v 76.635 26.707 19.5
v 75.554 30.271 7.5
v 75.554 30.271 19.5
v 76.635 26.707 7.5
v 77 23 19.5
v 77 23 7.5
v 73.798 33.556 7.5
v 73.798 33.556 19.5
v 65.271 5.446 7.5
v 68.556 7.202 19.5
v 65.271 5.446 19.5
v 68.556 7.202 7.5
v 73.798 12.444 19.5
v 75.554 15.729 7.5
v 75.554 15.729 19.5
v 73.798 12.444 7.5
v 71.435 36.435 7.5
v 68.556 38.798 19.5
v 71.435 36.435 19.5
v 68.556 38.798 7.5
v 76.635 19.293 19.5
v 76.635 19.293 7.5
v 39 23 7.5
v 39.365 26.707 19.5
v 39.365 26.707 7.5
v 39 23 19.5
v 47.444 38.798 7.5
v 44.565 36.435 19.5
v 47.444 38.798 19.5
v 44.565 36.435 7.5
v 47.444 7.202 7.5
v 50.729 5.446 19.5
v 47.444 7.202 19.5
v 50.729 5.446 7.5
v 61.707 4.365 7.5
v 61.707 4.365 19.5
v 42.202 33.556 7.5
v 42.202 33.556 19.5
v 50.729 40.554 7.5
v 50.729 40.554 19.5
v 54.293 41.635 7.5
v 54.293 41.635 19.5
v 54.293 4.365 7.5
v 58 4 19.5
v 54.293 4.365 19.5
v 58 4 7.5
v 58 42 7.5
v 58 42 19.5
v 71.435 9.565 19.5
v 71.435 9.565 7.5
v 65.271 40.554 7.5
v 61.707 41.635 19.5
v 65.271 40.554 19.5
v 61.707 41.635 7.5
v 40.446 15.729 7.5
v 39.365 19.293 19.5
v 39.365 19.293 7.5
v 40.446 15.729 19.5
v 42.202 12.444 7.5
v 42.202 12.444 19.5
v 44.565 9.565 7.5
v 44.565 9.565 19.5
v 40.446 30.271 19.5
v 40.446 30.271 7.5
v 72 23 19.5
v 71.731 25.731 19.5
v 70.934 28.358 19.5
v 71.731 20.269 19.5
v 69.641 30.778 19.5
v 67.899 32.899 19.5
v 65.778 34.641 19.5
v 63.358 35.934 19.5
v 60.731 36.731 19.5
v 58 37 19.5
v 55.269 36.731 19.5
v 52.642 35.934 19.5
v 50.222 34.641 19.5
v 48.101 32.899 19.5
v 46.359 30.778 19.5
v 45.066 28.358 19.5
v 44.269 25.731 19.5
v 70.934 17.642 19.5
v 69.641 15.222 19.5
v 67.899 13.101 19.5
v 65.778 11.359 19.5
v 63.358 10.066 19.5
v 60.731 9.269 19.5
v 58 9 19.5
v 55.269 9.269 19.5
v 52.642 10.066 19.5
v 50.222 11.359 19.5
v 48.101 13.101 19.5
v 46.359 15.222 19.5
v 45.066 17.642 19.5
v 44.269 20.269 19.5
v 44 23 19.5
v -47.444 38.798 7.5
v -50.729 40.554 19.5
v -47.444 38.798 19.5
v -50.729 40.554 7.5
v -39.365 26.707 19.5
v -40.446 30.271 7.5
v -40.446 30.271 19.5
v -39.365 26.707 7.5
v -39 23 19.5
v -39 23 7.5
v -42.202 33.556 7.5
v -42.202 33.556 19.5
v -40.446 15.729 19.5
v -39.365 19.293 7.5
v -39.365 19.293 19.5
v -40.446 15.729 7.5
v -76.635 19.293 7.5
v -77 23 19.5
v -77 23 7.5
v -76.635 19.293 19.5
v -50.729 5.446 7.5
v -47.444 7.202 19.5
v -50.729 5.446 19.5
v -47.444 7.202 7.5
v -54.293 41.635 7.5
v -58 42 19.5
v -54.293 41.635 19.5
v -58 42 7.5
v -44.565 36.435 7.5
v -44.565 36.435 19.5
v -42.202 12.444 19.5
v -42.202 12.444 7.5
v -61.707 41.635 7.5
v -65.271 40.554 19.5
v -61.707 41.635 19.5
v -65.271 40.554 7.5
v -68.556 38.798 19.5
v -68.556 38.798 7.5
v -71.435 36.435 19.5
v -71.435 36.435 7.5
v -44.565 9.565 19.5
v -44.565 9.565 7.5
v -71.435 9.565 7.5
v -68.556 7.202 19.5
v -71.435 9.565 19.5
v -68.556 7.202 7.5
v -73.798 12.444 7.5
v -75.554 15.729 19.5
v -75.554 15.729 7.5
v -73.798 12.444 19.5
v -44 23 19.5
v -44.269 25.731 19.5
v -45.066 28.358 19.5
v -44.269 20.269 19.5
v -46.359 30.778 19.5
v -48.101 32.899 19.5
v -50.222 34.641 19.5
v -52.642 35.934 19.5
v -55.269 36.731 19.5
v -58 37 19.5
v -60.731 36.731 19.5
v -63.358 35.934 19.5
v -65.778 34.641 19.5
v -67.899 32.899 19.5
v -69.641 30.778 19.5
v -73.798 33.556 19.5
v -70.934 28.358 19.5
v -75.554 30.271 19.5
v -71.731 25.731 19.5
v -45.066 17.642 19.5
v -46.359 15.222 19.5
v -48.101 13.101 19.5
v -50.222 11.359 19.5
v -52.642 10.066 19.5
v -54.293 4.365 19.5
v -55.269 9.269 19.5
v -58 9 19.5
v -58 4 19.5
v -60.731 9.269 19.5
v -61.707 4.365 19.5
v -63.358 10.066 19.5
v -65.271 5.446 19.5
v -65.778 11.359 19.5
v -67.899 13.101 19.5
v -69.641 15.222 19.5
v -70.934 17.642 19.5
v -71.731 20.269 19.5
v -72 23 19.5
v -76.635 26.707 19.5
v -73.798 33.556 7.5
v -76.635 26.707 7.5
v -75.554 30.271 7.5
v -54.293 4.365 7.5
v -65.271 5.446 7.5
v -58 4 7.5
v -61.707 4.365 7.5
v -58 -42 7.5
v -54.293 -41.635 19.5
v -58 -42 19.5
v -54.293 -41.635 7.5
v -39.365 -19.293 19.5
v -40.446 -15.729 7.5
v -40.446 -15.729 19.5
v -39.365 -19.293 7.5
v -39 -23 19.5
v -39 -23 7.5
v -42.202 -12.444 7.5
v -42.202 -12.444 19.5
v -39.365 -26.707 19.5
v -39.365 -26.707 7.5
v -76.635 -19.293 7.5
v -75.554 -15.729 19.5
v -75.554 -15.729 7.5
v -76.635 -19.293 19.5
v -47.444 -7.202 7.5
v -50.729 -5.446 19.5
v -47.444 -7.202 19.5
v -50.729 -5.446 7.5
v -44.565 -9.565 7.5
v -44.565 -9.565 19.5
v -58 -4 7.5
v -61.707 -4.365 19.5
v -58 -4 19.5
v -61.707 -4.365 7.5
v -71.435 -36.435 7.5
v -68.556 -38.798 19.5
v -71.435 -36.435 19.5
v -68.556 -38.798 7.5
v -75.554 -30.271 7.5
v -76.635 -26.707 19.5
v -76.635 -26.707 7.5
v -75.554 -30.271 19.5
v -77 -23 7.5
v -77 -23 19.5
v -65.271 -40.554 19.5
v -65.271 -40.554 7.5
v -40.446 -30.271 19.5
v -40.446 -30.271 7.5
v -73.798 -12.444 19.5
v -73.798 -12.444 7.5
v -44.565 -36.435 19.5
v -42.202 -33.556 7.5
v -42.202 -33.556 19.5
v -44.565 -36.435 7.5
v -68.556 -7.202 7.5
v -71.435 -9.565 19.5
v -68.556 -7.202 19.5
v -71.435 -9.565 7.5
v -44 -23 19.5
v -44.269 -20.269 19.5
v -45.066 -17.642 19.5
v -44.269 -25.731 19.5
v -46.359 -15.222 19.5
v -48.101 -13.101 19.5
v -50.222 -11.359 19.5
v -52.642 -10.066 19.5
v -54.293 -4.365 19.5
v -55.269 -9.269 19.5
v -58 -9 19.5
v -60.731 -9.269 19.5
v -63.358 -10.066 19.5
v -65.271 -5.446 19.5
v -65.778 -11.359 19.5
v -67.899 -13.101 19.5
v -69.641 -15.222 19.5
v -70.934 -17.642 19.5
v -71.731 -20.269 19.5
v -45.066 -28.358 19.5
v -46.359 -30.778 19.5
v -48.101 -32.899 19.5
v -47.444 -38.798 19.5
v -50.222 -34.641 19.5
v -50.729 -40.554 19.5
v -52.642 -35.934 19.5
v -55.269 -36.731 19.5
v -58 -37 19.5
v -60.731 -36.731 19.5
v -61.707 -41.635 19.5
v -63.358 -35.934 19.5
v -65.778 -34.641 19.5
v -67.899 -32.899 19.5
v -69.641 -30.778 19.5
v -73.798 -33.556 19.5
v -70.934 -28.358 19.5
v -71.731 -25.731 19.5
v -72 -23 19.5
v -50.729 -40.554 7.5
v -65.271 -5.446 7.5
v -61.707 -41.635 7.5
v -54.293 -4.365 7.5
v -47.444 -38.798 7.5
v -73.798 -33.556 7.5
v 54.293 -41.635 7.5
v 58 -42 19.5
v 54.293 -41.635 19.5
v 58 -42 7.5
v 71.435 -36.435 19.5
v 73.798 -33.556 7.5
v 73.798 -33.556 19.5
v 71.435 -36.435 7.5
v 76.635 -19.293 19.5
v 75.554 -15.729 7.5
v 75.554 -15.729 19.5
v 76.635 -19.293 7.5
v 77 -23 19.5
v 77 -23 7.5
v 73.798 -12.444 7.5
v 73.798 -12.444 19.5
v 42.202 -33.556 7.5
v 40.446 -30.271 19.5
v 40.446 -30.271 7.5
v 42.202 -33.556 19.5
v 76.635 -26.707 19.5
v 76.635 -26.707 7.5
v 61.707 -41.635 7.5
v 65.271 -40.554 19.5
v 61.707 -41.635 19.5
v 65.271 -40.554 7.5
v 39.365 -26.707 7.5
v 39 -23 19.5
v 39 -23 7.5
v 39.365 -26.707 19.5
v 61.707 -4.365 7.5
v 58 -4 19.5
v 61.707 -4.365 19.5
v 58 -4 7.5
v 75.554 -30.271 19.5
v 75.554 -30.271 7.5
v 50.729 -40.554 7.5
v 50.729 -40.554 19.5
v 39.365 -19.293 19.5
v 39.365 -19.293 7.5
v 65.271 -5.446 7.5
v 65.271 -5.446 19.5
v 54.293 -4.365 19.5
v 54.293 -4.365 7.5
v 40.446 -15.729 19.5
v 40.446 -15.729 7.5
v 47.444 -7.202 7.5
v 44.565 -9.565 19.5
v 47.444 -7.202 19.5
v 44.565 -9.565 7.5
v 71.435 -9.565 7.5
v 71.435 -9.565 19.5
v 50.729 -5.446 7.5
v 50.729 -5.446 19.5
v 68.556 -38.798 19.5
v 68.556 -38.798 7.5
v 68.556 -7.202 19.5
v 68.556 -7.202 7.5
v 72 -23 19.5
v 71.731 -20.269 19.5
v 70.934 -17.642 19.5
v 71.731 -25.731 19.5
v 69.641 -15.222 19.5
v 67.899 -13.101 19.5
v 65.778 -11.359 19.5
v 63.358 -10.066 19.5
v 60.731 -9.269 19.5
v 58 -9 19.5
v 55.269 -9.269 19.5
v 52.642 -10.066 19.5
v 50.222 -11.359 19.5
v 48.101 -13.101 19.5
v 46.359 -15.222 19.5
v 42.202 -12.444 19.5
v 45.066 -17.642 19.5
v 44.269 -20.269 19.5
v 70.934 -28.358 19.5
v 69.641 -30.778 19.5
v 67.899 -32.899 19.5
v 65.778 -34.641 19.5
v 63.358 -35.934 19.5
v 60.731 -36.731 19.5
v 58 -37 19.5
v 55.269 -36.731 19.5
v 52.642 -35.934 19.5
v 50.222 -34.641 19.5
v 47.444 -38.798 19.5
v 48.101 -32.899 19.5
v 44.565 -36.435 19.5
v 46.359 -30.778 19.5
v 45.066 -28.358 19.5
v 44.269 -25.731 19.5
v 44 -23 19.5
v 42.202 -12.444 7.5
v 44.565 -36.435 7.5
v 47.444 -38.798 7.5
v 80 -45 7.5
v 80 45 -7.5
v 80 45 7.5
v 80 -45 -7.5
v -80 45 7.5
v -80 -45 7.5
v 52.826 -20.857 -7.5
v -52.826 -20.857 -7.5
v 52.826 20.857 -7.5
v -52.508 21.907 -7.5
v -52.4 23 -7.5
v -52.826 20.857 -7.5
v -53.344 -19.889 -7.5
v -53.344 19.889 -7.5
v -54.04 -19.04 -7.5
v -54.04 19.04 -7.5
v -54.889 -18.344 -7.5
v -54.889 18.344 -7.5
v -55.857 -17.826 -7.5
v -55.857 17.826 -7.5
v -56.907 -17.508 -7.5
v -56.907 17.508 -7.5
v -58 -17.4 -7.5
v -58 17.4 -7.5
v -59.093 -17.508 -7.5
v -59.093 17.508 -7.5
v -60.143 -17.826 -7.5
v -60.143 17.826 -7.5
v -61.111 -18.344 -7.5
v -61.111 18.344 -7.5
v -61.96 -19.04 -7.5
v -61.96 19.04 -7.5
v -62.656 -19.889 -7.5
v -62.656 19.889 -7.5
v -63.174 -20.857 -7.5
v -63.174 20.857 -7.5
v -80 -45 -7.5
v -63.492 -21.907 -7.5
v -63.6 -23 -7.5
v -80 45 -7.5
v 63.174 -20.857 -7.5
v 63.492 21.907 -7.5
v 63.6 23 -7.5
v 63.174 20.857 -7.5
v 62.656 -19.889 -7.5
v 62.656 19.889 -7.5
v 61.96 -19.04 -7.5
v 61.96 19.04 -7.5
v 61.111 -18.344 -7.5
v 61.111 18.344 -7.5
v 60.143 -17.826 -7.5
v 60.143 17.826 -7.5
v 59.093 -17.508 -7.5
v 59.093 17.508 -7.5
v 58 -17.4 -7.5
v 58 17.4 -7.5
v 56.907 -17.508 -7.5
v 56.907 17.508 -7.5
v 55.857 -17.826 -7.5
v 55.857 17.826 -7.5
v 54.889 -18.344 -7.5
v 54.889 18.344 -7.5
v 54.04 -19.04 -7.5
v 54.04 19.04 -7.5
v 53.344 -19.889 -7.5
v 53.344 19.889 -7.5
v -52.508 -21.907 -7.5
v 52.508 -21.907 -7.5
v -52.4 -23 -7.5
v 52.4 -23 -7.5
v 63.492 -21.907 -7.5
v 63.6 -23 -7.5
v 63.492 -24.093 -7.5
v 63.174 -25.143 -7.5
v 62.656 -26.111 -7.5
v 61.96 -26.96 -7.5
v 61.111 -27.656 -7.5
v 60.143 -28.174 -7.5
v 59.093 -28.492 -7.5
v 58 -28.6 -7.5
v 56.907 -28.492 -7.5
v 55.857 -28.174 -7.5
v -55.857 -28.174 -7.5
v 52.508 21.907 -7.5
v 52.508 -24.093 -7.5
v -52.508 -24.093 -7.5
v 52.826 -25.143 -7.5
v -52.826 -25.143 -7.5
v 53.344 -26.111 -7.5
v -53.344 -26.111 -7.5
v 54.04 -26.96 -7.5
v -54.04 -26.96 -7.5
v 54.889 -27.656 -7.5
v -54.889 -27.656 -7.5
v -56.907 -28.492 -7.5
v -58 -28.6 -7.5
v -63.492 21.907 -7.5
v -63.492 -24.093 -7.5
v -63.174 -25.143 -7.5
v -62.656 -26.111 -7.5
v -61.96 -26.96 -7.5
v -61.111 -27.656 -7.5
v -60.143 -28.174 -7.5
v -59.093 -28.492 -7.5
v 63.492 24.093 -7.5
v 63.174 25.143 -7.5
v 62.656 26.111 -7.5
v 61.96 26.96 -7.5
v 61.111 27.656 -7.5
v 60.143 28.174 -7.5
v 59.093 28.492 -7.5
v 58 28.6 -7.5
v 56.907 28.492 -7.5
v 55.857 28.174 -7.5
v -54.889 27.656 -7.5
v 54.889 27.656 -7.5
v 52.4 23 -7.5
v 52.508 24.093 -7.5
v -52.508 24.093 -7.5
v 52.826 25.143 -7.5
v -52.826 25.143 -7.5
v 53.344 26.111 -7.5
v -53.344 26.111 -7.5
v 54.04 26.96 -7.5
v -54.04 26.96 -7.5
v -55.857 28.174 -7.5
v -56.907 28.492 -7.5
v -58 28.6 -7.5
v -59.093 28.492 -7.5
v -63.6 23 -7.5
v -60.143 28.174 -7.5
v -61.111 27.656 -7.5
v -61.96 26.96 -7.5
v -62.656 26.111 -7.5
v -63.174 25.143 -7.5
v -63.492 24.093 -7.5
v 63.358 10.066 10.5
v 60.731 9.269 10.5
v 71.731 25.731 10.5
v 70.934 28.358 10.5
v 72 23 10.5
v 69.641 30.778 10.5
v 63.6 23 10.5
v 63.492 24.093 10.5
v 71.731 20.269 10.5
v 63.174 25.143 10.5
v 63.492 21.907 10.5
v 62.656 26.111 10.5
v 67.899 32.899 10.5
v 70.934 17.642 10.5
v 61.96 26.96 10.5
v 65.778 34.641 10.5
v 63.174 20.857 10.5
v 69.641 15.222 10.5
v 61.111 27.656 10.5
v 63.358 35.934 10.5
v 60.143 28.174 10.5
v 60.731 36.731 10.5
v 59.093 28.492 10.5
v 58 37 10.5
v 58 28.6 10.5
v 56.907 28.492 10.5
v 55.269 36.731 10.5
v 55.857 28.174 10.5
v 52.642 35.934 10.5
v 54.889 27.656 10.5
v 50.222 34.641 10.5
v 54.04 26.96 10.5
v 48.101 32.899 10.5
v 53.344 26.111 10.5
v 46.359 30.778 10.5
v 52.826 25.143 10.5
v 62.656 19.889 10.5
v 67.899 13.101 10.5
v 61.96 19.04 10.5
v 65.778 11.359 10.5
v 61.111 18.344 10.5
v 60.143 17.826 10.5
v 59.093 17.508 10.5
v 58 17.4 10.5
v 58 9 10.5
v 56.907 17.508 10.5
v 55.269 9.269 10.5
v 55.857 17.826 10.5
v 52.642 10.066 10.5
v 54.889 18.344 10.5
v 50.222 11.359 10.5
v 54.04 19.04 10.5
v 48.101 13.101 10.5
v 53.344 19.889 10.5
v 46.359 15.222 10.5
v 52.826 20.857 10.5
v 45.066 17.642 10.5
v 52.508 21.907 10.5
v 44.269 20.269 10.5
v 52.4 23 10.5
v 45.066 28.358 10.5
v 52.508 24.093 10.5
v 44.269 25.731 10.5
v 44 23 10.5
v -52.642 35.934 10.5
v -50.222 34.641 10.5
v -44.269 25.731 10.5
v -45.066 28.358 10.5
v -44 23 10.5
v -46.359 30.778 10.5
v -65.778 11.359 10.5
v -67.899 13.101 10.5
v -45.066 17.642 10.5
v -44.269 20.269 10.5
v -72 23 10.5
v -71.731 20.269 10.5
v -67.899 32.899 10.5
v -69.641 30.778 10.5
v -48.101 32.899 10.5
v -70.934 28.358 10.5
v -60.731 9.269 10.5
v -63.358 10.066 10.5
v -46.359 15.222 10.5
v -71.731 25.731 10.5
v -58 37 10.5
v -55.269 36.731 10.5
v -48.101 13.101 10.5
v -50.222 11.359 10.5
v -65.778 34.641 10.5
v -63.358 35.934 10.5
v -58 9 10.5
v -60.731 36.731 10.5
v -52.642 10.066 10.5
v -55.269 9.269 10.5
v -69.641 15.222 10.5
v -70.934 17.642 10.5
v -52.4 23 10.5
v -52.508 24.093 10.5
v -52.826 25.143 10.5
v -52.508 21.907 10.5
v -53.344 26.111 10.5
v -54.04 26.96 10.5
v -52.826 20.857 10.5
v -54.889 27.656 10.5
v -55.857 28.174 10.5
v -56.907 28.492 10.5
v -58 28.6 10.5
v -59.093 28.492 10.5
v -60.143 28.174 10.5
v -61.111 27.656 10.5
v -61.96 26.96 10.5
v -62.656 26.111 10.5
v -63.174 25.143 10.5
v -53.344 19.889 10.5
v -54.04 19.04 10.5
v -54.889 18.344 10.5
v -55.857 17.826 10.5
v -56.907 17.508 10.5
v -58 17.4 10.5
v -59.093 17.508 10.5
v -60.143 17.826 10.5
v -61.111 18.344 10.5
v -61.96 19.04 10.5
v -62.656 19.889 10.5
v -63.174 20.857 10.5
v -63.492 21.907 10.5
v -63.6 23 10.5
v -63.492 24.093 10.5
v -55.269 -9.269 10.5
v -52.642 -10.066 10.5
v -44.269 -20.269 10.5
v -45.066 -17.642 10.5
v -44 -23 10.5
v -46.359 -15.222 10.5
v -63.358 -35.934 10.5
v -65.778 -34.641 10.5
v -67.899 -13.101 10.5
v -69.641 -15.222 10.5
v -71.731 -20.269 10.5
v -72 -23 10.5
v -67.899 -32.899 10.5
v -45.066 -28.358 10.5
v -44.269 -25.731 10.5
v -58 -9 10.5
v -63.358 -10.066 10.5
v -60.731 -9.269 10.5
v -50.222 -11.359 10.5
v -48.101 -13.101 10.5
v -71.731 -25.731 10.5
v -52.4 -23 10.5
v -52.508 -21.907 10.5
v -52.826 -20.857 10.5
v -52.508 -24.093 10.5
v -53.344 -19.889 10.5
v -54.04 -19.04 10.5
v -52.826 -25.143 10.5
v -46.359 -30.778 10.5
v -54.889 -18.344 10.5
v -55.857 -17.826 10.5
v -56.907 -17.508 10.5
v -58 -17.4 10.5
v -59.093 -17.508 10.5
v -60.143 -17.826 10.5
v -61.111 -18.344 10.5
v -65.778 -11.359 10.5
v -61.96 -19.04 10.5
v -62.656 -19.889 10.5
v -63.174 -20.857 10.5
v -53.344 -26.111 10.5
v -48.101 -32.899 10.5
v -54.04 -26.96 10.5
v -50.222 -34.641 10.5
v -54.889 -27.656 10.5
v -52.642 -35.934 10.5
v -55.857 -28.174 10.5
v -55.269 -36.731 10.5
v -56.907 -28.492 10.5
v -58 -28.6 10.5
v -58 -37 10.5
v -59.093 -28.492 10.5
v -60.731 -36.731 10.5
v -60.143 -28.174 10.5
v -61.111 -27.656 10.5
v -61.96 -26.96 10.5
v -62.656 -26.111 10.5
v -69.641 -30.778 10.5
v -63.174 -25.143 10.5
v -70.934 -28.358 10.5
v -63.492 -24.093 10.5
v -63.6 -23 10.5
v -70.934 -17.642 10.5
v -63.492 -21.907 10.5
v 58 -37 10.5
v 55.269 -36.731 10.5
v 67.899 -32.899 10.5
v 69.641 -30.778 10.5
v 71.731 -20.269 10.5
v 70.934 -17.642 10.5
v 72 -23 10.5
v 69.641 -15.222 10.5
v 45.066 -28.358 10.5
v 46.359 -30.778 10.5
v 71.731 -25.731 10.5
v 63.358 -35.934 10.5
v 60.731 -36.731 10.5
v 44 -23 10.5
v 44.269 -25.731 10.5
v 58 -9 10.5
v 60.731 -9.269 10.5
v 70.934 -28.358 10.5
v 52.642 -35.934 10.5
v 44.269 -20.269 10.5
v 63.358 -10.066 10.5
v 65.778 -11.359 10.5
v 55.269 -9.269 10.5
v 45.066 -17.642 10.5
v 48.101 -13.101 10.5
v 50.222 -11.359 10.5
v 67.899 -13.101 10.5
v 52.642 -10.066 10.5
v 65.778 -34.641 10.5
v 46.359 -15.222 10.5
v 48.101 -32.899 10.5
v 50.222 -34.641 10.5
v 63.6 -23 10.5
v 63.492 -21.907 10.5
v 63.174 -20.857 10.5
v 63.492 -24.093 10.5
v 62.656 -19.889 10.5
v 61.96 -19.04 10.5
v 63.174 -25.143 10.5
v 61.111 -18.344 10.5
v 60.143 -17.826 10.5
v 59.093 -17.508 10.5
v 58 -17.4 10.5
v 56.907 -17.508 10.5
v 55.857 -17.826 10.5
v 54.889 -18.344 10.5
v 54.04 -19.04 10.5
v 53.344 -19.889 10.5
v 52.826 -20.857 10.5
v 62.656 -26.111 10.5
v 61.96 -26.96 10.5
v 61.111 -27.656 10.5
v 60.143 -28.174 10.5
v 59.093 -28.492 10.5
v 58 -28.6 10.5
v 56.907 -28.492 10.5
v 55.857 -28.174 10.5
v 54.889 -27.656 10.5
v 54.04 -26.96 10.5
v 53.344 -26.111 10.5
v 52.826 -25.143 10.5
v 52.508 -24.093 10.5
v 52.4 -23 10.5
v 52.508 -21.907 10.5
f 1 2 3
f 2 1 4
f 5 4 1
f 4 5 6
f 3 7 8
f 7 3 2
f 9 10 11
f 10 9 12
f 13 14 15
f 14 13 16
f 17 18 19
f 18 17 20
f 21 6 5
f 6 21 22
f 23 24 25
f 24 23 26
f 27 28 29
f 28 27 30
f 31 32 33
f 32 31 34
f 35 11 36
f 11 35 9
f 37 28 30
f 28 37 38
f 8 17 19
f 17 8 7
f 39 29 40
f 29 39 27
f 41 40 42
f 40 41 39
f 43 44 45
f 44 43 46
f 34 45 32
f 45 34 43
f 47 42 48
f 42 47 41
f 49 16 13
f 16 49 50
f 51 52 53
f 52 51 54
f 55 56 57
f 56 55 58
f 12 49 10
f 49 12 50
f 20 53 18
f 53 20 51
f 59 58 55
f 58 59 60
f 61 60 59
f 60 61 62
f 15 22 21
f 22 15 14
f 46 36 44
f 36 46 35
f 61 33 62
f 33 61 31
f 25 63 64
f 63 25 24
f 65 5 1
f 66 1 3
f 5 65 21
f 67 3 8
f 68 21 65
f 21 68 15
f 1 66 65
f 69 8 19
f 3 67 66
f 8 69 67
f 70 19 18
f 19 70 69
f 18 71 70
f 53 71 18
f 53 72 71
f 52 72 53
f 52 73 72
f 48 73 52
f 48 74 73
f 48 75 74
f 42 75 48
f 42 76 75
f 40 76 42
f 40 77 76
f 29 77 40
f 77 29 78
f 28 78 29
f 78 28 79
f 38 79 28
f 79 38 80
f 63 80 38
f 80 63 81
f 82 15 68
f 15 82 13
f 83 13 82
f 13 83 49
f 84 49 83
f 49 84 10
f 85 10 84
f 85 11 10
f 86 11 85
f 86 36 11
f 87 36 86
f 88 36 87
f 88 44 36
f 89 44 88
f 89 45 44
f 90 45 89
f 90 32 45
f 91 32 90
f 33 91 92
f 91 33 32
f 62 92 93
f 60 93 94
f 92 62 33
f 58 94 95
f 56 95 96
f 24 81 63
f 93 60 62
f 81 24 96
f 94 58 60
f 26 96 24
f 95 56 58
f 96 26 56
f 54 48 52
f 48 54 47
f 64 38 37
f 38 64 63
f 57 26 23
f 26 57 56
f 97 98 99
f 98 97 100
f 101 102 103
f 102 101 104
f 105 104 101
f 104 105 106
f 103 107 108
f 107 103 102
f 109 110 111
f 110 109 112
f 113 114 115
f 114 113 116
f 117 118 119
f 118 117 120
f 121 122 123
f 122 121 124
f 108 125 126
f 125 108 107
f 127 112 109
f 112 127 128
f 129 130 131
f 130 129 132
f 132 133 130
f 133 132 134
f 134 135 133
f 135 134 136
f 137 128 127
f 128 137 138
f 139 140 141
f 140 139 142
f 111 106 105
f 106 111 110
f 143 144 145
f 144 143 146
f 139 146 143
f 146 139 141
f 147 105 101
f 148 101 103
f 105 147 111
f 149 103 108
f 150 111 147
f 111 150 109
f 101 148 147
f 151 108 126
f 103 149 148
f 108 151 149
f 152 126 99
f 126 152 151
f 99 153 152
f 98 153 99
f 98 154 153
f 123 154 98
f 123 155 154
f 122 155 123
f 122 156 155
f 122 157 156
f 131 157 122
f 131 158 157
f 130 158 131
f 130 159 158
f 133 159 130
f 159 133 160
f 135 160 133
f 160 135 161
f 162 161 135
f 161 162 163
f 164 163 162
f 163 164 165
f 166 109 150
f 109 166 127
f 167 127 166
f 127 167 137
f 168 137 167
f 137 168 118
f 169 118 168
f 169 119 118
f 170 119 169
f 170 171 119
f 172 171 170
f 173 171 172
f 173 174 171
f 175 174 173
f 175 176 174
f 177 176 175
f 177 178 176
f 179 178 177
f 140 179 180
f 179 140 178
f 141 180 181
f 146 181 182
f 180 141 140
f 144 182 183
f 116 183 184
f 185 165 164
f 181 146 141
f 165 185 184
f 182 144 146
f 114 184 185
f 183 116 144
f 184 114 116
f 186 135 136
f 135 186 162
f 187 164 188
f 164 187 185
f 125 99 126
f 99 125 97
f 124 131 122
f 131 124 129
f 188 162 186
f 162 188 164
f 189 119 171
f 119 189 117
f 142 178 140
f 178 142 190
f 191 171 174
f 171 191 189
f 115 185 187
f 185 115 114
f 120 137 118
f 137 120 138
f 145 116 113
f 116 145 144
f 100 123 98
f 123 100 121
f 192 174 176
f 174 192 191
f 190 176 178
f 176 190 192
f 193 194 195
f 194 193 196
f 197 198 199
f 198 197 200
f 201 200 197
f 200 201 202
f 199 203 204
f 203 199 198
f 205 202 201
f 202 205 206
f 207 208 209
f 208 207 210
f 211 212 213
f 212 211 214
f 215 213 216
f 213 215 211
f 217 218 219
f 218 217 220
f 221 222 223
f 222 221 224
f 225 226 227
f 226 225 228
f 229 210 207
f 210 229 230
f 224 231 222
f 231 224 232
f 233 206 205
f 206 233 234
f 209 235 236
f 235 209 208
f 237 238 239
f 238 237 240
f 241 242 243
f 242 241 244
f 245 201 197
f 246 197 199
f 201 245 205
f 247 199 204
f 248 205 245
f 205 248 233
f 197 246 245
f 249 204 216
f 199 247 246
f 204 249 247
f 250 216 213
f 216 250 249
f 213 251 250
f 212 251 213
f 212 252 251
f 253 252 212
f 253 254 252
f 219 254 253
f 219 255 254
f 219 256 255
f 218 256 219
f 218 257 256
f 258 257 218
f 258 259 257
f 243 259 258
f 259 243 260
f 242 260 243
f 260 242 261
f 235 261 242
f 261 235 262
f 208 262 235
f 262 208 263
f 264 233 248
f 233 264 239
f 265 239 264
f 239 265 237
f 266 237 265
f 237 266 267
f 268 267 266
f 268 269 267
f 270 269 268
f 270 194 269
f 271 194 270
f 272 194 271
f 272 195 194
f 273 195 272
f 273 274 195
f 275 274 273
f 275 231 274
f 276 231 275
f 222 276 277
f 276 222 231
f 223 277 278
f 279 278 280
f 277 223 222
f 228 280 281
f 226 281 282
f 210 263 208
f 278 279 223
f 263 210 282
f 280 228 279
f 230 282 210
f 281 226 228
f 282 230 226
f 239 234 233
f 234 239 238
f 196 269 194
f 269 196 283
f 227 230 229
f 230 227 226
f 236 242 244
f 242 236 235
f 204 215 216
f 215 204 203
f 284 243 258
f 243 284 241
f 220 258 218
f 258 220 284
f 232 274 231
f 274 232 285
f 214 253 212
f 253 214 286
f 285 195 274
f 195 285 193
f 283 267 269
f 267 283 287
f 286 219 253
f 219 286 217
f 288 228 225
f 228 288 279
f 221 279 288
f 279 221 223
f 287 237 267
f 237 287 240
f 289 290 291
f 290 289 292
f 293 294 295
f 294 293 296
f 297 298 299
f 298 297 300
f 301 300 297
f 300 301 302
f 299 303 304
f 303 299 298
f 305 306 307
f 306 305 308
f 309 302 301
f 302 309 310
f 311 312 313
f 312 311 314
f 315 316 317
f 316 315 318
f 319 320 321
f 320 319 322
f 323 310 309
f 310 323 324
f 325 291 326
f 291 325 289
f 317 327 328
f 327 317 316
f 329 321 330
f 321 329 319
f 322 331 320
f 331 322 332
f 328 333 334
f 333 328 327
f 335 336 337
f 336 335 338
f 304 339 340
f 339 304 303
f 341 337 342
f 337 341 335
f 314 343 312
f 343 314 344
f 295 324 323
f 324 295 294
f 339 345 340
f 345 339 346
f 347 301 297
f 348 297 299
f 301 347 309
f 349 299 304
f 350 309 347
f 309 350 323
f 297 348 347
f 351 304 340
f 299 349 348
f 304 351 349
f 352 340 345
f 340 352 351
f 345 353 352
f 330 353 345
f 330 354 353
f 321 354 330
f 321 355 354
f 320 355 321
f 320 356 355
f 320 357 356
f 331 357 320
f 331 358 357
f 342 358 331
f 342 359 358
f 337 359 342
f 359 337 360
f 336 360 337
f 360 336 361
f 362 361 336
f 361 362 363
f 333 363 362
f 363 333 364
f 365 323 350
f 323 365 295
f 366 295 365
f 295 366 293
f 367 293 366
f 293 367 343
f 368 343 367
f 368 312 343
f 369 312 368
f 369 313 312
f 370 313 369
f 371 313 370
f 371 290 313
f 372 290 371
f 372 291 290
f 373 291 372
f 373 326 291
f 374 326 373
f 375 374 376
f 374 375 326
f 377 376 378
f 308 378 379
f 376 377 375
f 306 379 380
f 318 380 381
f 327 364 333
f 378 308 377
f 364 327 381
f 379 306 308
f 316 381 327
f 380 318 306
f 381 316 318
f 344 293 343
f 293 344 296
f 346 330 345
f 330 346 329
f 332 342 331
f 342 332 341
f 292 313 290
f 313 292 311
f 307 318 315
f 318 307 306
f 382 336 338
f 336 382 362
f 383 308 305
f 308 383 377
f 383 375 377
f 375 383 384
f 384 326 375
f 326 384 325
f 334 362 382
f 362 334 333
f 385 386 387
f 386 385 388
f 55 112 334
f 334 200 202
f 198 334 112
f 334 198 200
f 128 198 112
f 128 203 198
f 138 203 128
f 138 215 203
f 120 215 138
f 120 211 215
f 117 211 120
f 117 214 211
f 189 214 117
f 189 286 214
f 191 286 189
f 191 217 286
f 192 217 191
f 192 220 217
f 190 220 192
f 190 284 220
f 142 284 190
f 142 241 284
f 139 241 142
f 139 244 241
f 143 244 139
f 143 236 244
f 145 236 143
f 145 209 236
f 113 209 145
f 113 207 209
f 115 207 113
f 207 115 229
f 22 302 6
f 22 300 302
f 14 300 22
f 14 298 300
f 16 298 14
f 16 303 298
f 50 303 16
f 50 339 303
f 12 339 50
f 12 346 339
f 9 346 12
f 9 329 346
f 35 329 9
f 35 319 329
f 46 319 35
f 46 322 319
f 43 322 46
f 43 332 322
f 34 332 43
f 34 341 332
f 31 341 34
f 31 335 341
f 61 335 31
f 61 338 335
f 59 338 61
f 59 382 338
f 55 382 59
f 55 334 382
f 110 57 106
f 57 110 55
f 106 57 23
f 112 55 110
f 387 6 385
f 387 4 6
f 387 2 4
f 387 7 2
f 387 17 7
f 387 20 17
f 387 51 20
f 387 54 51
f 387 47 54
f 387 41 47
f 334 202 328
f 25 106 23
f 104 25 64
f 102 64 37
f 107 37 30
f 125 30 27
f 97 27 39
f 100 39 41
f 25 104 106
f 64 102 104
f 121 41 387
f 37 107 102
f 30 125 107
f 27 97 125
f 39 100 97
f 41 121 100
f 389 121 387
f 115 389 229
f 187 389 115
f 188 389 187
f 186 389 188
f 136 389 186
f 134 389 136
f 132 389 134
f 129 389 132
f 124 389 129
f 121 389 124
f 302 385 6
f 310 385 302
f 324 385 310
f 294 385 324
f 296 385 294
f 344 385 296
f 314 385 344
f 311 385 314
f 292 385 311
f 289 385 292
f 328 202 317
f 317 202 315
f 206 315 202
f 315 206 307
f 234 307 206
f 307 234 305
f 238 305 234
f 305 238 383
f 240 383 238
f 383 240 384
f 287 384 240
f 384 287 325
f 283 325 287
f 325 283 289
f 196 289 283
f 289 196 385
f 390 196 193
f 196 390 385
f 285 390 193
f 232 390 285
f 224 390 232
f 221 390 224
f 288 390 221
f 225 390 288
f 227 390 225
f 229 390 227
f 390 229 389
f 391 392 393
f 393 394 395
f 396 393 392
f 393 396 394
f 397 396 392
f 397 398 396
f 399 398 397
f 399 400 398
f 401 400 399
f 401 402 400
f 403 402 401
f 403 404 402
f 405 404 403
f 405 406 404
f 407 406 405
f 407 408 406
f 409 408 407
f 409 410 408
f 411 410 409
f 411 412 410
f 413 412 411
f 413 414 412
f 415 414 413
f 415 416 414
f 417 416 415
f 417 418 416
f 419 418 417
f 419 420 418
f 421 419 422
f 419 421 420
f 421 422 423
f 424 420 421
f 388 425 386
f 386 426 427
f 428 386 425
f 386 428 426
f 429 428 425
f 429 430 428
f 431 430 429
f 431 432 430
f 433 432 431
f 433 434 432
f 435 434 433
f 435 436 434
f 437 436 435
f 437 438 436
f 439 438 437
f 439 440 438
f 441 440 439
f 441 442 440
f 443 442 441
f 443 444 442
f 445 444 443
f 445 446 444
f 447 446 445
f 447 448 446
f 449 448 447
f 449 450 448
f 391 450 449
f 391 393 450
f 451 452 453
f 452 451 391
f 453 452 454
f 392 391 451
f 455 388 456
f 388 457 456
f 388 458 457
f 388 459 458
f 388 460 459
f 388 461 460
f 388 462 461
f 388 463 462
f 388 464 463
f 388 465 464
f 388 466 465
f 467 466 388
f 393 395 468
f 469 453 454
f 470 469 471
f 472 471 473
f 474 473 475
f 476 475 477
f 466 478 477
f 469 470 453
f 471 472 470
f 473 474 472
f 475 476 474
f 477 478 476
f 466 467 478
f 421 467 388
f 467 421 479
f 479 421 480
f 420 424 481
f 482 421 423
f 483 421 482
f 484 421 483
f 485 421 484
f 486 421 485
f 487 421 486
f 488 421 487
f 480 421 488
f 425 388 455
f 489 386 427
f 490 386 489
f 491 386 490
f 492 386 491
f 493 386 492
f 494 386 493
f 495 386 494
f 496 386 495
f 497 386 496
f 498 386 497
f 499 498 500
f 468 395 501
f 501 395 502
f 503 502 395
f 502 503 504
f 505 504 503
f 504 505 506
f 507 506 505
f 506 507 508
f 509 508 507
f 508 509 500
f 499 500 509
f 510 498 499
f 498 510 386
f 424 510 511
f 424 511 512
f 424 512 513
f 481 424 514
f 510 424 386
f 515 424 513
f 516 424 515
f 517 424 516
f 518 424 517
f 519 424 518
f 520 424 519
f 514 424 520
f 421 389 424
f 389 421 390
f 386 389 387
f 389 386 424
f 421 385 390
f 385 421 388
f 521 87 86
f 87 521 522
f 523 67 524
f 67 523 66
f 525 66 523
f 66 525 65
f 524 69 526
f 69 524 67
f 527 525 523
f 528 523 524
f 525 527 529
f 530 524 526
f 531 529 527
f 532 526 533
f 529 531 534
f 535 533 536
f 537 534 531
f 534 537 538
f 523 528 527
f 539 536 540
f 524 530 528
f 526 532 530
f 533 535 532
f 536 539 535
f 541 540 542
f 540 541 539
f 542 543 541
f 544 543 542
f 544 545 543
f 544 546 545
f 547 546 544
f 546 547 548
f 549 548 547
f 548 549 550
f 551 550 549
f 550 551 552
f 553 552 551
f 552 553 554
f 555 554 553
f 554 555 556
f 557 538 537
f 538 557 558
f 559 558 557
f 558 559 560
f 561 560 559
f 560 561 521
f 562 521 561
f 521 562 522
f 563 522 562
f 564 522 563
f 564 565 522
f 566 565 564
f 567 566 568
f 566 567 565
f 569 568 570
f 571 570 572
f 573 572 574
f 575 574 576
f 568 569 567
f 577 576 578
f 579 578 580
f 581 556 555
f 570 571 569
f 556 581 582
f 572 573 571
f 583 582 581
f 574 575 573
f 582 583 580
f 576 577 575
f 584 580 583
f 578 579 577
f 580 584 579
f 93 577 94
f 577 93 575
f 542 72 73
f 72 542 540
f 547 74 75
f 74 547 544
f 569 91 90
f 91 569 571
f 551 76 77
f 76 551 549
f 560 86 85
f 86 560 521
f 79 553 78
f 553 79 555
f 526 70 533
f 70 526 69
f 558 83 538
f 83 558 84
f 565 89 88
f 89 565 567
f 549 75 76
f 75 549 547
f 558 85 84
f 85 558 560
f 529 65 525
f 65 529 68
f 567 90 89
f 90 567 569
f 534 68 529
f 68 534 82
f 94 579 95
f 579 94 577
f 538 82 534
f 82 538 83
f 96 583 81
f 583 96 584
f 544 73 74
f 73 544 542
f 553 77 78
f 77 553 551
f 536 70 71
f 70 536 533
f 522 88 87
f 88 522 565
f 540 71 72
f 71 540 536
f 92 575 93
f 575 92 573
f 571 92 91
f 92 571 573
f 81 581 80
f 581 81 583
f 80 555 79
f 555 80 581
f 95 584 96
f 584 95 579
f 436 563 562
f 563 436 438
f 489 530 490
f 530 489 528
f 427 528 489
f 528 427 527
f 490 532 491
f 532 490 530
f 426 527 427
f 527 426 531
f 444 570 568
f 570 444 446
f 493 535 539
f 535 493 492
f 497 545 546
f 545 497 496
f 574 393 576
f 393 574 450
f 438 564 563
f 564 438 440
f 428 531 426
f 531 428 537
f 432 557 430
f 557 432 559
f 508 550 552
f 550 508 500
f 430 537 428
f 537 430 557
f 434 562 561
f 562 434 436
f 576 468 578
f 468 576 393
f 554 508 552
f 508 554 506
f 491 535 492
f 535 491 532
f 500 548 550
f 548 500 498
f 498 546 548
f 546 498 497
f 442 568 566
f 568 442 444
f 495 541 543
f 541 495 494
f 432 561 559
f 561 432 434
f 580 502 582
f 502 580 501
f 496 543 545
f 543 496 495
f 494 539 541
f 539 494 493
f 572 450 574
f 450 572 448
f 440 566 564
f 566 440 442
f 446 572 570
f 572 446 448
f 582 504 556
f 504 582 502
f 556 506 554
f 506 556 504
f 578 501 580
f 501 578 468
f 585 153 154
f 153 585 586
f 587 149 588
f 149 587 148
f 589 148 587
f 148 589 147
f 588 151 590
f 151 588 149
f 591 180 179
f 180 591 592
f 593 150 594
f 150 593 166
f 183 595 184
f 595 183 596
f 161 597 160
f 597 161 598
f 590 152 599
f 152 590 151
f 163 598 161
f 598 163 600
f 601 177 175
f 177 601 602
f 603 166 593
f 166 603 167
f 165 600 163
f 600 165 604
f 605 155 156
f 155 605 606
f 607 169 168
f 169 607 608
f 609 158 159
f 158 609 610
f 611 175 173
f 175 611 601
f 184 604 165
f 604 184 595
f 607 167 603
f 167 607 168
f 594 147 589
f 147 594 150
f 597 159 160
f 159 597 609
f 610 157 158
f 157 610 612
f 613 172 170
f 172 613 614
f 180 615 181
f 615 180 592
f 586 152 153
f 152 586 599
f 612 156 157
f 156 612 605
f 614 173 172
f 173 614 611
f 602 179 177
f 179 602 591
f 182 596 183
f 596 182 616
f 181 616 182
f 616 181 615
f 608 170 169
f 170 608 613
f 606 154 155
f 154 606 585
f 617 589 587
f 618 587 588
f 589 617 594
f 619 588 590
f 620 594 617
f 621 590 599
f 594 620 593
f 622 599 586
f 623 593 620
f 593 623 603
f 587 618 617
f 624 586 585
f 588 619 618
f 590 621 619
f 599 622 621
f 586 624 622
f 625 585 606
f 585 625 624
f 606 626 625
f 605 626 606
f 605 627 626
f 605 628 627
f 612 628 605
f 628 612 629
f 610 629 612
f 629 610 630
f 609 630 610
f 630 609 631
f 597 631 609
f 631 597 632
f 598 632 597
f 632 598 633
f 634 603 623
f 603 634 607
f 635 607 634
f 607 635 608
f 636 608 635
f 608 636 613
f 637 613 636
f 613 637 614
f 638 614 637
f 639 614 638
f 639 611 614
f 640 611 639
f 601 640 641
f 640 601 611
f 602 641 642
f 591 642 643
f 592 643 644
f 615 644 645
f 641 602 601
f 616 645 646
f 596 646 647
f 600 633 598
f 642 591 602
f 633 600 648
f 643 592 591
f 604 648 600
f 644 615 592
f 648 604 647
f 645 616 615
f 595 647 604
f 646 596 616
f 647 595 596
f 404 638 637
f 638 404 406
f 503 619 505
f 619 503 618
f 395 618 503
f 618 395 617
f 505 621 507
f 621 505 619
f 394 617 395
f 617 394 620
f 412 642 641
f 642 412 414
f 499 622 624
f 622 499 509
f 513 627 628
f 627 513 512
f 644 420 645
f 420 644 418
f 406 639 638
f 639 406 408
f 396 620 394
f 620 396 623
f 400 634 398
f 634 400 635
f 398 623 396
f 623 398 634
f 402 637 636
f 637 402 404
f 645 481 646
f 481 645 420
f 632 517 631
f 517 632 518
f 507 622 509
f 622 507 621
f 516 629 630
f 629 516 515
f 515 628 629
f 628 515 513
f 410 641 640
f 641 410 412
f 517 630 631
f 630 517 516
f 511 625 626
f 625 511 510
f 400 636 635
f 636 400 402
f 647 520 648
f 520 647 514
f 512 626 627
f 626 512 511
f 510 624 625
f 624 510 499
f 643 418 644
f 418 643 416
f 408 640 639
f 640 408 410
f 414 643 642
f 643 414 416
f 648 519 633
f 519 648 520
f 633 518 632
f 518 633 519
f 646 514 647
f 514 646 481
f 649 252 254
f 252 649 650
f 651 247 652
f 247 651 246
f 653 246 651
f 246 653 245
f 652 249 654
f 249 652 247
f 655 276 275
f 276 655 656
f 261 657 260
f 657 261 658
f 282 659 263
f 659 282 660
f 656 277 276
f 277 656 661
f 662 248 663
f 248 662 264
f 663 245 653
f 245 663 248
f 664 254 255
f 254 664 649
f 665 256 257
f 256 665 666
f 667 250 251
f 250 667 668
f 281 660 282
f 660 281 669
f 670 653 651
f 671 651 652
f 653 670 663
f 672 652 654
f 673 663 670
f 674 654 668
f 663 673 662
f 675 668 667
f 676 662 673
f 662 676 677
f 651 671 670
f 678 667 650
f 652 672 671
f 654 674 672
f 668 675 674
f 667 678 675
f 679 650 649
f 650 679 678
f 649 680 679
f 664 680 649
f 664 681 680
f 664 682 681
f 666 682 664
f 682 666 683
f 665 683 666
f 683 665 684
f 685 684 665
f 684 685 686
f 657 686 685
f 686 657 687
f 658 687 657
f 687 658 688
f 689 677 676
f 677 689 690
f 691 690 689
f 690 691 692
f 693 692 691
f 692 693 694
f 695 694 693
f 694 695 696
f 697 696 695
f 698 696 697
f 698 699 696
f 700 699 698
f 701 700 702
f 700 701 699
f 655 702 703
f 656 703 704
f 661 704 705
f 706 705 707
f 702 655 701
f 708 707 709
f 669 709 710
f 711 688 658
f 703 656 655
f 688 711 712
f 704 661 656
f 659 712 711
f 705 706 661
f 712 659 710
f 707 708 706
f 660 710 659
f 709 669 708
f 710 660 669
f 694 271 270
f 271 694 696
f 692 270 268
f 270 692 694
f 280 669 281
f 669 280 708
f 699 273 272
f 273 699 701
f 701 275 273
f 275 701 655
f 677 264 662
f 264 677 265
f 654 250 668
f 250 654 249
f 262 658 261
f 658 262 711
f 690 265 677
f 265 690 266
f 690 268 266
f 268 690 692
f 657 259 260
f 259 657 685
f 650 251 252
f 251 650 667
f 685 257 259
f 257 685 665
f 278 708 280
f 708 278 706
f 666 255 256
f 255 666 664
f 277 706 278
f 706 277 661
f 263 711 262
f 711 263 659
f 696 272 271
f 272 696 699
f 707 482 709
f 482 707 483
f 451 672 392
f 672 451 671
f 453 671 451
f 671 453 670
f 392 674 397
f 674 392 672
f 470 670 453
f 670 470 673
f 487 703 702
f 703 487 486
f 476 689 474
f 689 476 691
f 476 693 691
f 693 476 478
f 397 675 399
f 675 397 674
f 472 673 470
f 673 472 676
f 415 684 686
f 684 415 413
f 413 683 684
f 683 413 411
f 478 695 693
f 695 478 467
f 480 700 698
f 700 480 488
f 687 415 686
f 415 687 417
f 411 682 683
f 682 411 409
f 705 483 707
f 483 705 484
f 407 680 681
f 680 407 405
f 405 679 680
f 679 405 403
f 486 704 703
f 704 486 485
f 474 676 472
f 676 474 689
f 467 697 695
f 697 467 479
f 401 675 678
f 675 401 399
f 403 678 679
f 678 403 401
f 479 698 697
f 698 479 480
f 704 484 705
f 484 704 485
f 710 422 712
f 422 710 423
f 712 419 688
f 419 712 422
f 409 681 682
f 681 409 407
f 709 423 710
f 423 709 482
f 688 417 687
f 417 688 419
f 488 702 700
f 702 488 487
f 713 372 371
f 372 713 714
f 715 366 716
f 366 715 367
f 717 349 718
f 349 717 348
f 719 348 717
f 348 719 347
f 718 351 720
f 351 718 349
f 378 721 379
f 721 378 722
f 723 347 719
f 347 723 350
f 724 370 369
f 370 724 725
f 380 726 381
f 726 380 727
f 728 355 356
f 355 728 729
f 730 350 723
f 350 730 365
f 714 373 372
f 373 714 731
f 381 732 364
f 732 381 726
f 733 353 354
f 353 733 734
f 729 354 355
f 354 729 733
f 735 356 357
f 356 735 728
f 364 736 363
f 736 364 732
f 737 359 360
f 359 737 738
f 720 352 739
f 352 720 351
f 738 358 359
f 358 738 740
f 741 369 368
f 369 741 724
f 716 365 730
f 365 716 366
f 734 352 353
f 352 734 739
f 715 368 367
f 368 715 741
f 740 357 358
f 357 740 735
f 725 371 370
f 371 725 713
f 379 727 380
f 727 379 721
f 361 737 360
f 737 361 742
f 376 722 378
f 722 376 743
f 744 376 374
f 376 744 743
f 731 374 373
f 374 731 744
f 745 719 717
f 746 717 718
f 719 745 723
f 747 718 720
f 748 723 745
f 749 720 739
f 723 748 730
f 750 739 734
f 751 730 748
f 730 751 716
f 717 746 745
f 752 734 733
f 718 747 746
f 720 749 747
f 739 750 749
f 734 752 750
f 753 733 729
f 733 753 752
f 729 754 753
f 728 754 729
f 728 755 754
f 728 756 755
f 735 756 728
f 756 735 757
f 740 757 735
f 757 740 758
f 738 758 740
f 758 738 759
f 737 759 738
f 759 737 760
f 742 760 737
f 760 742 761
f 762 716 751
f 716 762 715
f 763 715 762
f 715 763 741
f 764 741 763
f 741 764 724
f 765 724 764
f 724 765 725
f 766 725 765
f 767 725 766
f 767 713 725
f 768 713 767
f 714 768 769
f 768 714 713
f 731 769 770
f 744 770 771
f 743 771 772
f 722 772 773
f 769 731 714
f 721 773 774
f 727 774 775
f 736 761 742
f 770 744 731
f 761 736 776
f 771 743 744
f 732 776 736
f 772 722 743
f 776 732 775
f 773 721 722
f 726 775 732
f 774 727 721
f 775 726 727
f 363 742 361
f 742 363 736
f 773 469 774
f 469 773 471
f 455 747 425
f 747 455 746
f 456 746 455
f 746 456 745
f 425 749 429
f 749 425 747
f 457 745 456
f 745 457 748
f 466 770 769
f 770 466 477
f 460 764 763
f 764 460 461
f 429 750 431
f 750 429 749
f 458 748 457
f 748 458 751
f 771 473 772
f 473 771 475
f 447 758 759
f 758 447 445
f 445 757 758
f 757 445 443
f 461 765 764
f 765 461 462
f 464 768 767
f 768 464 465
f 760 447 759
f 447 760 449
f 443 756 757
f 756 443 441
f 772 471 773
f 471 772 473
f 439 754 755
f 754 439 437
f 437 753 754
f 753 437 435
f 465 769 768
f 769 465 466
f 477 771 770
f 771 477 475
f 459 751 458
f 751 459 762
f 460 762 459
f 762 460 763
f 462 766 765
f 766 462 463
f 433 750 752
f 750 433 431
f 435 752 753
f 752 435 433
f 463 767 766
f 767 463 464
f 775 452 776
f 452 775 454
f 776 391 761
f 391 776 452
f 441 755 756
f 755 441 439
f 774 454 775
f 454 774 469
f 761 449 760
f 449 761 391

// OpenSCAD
$fn = 32;

// ----------------------------------------------------------------------
// Socket pad plate
// bosses with counterbored sockets for the screws
// ----------------------------------------------------------------------

// --- parameters (mm) ---
base_t = 15;            // base plate thickness
boss_h = 12;            // boss height above the base plate
boss_d = 38;            // boss diameter
socket_d = 28;          // socket diameter
socket_depth = 9;       // socket depth from the boss face
bolt_d = 11.2;          // screw clearance hole through the socket floor
plate = [160, 90, 15];  // overall size (x, y, z)
edge = 22;              // boss centre offset from the plate edge
pads = 4;               // boss count, one per corner

// --- derived feature positions (mm) ---
height = base_t + boss_h;        // = 27   overall height of the part
corner_x = plate[0] / 2 - edge;  // = 58   boss centre X
corner_y = plate[1] / 2 - edge;  // = 23   boss centre Y
feature_centers = [
  [corner_x, corner_y],
  [-corner_x, corner_y],
  [-corner_x, -corner_y],
  [corner_x, -corner_y]
];   // boss centres: sockets, holes and the pads themselves are placed from here

// base plate, bosses on feature_centers, socket + through hole in each
difference() {
  union() {
    cube(plate, center = true);
    for (centre = feature_centers)
      translate([centre[0], centre[1], plate[2] / 2 - 1])
        cylinder(d = boss_d, h = boss_h + 1);
  }
  for (centre = feature_centers) {
    translate([centre[0], centre[1], plate[2] / 2 + boss_h - socket_depth])
      cylinder(d = socket_d, h = socket_depth + 1);
    translate([centre[0], centre[1], -height])
      cylinder(d = bolt_d, h = 2 * height + 2);  // through the socket floor
  }
}
